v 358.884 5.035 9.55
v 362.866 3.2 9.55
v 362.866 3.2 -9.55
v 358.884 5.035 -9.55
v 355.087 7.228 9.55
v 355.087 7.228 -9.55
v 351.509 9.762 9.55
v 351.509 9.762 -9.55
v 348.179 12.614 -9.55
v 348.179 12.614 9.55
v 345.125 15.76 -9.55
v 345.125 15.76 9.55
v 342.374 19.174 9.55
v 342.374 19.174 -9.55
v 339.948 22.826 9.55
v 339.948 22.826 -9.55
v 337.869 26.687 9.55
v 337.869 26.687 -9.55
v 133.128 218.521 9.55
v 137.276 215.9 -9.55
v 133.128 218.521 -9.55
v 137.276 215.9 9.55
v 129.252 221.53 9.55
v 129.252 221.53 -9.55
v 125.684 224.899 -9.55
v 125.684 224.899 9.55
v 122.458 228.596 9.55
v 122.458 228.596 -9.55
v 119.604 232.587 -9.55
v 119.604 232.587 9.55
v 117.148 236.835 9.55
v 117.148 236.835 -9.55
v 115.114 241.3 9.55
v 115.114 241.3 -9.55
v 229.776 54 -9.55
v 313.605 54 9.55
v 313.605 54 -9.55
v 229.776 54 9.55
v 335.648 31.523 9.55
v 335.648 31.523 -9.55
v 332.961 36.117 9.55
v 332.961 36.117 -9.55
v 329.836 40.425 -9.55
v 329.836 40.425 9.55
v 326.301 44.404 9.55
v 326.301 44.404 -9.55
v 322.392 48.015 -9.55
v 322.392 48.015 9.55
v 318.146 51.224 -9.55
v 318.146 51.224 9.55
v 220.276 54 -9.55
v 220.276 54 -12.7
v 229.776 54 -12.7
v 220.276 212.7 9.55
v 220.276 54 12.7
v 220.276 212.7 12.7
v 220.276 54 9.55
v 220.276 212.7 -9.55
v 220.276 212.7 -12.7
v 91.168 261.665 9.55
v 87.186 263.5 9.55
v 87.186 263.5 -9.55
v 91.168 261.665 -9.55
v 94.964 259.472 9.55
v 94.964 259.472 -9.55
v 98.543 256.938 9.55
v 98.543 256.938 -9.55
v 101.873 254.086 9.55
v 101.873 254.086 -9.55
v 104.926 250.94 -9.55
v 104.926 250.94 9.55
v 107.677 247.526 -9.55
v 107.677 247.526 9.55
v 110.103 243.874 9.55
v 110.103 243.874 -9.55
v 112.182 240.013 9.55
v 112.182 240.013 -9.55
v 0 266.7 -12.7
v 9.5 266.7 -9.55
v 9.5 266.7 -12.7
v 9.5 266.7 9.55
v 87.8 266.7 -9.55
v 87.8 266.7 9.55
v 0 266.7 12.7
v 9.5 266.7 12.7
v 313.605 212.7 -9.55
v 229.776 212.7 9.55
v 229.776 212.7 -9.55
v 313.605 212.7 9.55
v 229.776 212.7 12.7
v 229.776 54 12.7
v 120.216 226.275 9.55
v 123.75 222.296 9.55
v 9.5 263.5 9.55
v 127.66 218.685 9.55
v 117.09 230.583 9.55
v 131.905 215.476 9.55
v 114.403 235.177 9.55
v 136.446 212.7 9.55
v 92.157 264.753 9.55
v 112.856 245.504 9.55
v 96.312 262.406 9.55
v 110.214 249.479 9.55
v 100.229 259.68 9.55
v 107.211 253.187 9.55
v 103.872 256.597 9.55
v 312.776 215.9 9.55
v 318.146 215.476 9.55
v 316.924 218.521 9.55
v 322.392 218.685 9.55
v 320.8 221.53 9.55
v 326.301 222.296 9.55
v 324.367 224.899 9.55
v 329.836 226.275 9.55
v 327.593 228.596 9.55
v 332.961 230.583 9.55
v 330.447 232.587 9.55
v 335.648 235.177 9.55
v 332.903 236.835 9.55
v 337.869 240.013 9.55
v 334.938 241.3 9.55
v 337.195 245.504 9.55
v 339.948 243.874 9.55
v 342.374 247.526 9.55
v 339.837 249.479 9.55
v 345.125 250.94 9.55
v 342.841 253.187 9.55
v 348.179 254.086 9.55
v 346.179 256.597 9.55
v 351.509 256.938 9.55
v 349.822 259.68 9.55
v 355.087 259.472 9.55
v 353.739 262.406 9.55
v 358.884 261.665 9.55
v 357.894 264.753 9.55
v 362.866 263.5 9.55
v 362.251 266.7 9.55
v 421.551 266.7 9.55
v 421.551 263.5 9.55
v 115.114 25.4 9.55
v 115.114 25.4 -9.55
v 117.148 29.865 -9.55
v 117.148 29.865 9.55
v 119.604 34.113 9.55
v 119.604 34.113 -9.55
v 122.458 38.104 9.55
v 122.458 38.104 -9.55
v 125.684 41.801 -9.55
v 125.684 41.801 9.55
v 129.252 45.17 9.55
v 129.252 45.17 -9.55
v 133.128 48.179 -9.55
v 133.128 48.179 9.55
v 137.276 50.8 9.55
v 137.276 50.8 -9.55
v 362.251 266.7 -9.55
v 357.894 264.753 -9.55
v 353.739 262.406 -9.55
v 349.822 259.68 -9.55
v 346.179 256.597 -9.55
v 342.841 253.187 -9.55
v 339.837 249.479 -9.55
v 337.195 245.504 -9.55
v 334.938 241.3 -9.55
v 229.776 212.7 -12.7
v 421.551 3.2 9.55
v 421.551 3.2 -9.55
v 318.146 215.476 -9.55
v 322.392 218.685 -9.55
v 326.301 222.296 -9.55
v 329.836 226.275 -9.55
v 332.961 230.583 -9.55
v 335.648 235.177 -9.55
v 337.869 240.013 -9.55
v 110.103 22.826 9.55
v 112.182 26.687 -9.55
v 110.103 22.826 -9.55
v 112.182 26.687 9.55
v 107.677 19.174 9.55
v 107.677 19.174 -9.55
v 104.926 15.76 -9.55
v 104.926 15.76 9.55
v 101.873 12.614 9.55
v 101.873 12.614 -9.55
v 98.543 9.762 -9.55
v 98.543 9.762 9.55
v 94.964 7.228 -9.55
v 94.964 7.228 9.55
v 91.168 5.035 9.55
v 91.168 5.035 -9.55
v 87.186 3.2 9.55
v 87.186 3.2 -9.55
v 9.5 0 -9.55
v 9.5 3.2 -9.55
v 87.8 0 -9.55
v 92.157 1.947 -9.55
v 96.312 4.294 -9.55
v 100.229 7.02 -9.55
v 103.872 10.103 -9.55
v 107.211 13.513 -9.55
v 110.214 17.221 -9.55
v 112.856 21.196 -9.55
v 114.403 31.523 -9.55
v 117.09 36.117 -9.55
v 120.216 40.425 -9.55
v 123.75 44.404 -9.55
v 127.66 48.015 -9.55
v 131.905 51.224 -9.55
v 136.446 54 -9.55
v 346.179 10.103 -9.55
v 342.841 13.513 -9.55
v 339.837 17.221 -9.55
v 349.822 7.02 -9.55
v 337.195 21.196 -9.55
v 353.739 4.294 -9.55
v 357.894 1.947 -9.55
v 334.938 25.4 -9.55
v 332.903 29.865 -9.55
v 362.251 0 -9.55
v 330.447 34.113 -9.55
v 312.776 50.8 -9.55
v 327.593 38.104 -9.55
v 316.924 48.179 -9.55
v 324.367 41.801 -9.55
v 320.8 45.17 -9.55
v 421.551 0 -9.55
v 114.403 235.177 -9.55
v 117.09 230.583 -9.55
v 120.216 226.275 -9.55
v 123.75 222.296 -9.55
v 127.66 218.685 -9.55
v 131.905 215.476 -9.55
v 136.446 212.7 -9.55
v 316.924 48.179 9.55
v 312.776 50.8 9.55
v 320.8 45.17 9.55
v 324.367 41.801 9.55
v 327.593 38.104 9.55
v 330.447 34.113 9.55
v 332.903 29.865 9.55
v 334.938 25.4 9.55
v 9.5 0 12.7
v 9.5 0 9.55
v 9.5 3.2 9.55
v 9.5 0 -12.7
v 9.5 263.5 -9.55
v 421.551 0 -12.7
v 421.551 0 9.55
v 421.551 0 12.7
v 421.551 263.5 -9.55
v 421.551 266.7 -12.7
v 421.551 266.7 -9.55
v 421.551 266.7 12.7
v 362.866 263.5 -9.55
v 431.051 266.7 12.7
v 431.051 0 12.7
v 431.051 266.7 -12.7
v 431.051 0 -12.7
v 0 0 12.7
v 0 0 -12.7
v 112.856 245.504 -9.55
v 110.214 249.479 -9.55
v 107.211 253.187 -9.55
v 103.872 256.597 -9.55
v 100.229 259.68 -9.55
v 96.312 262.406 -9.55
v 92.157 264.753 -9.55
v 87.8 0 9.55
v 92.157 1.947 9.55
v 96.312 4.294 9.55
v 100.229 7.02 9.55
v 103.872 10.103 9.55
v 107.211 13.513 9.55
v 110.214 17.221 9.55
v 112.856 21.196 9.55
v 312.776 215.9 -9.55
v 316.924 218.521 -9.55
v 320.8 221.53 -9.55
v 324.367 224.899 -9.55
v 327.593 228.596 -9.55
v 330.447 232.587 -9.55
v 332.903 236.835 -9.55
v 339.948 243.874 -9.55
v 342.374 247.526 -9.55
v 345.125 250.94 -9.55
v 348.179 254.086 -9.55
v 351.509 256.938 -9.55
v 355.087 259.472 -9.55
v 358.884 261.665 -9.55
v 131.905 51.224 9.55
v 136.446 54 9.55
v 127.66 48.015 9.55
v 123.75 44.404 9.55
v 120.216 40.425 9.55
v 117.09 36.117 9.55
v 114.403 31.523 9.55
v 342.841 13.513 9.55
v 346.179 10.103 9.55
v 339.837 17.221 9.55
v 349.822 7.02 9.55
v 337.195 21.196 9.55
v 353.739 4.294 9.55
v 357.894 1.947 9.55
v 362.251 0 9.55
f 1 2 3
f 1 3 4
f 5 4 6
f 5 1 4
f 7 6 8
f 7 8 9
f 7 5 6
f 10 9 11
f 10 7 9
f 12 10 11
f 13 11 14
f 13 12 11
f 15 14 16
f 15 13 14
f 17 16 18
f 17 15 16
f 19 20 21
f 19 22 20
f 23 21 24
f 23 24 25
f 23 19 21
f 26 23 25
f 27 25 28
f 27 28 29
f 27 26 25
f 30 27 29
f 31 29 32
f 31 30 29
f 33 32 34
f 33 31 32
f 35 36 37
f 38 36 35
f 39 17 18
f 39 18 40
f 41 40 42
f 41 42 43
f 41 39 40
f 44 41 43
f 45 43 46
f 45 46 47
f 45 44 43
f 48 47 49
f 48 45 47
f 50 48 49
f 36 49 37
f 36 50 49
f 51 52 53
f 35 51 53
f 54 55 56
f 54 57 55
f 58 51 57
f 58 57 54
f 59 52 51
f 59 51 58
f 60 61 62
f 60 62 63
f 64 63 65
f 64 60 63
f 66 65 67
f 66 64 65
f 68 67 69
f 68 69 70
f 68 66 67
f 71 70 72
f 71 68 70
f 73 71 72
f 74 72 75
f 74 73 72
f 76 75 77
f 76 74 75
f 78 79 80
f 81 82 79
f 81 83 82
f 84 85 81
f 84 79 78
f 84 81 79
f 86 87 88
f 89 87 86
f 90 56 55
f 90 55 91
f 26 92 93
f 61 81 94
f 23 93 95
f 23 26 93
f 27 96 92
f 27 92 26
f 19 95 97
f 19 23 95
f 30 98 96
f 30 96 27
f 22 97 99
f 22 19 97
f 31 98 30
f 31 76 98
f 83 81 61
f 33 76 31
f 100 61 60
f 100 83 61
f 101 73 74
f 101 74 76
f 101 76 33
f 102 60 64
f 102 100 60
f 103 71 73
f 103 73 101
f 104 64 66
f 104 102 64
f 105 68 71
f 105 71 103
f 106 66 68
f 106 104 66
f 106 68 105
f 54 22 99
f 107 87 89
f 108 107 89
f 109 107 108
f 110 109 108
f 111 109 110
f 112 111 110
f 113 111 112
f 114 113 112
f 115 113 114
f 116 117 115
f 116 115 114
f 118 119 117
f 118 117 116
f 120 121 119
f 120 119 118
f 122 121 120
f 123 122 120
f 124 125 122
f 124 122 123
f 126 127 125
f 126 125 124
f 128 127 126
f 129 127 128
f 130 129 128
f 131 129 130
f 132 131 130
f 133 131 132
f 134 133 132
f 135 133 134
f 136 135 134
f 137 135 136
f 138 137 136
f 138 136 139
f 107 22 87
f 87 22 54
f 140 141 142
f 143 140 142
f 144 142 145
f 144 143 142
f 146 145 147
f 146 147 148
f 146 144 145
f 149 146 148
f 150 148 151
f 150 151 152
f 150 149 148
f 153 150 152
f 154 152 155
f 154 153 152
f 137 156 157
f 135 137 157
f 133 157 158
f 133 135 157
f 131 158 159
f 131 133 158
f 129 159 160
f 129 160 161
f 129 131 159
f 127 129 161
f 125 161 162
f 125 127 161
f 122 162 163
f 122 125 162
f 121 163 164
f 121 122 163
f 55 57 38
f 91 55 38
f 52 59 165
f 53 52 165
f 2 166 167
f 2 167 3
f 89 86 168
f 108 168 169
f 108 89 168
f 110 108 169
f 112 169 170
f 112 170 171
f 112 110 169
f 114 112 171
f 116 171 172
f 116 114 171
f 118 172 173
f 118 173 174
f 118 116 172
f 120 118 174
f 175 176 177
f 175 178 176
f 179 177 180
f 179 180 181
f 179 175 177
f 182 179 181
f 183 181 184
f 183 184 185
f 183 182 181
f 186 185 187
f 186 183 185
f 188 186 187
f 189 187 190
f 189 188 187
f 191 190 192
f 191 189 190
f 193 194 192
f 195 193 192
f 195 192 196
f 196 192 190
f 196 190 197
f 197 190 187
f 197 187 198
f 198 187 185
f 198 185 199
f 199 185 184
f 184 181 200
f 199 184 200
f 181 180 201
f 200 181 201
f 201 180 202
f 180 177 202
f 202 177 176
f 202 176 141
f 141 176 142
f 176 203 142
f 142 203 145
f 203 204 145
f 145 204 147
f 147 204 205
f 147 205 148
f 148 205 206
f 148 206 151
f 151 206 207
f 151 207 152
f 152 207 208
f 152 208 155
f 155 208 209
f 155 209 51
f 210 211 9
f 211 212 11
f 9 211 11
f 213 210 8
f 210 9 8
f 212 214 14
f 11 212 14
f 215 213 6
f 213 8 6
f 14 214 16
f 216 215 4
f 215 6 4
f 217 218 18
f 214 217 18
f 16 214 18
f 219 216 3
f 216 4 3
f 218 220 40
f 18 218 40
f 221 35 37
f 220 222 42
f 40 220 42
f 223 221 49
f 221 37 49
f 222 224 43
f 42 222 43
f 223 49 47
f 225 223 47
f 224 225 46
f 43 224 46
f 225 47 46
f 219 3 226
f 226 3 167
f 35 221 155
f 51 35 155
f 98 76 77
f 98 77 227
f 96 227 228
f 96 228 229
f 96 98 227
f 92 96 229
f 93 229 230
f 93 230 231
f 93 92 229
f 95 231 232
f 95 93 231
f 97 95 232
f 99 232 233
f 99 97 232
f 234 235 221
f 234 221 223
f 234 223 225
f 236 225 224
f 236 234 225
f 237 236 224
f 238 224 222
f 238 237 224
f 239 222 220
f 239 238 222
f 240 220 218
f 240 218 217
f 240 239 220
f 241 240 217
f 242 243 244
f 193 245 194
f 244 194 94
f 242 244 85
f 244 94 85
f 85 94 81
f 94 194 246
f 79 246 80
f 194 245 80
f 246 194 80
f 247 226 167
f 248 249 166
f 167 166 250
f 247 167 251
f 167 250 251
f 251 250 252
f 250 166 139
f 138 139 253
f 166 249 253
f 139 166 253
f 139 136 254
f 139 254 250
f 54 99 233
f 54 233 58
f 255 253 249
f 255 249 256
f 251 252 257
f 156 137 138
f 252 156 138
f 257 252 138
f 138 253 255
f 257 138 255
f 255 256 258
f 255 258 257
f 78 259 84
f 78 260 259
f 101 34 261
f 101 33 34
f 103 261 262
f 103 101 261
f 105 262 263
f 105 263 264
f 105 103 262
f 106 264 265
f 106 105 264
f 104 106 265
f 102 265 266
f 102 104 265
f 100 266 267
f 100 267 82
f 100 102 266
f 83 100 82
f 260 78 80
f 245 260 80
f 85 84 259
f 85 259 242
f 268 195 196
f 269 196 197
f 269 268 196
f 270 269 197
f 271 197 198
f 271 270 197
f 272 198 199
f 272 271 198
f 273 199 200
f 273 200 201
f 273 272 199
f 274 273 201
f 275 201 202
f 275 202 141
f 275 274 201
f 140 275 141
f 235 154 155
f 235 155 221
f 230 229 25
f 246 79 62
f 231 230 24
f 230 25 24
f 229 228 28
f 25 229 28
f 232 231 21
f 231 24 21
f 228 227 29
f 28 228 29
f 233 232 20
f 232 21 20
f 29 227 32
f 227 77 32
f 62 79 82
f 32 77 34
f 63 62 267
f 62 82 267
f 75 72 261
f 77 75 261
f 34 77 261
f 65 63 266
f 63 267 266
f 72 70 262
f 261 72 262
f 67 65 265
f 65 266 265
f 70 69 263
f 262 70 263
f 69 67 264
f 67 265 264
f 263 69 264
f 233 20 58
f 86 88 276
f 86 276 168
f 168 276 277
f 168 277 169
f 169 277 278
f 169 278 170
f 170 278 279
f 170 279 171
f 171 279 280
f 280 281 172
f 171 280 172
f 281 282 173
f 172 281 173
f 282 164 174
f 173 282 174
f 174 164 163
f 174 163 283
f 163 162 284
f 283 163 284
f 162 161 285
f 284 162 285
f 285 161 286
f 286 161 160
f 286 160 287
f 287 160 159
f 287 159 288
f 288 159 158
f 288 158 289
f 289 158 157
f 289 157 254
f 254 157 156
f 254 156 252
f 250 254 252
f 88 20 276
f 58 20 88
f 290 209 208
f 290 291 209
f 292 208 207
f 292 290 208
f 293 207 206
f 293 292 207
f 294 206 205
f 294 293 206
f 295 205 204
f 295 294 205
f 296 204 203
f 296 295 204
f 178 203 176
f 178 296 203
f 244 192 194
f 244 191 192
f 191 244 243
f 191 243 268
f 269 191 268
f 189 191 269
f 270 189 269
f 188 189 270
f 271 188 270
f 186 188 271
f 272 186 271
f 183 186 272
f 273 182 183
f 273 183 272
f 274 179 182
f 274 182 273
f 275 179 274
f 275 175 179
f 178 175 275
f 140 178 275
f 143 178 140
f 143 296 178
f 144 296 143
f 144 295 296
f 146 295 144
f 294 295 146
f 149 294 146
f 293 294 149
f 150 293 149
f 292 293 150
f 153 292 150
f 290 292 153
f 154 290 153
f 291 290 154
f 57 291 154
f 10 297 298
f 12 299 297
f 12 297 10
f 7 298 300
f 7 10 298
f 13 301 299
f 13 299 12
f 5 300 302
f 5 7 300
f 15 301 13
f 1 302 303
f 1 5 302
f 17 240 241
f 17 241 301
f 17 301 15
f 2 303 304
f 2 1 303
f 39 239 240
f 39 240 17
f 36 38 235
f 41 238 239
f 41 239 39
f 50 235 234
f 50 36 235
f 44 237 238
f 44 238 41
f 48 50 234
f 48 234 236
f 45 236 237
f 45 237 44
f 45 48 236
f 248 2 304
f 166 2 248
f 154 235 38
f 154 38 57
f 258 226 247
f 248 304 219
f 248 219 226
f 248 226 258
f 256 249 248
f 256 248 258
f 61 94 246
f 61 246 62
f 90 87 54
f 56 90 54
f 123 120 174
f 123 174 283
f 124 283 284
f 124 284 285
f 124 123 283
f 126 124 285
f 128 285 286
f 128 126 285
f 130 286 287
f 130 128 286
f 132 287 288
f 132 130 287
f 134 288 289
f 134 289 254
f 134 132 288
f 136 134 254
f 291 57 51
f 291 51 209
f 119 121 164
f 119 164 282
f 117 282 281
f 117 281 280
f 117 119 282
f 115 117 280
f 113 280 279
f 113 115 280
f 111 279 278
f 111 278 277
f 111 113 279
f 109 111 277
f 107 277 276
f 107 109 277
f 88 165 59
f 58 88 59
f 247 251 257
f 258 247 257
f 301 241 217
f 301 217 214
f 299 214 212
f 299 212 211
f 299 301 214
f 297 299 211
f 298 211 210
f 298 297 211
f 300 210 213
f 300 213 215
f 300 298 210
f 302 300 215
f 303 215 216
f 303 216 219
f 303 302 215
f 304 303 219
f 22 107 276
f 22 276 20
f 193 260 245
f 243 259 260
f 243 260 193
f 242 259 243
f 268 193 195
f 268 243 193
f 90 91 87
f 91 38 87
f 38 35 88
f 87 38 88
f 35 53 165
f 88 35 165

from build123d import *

# Parameters (mm, degrees)
BOSS_EXTRUDE1_DEPTH   = 9.55
BOSS_EXTRUDE1_2_DEPTH = 9.55
SKETCH2_W             = 9.5
SKETCH2_H             = 266.7
SKETCH2_W_2           = 4.75
SKETCH2_H_2           = 158.7
BOSS_EXTRUDE2_DEPTH   = 12.7


with BuildPart() as part:
    # Sketch1 → Boss-Extrude1 (new, symmetric)
    with BuildSketch(Plane.XY):
        with BuildLine():
            Line((87.8, 266.7), (9.5, 266.7))
            Line((9.5, 266.7), (9.5, 263.5))
            Line((9.5, 263.5), (87.185653041, 263.5))
            ThreePointArc((87.185653041, 263.5), (101.872730764, 254.086326296), (112.181844193, 240.013313649))
            ThreePointArc((112.181844193, 240.013313649), (121.93402425, 224.242253512), (136.446354787, 212.7))
            Line((136.446354787, 212.7), (313.604913576, 212.7))
            ThreePointArc((313.604913576, 212.7), (328.117244113, 224.242253512), (337.86942417, 240.013313649))
            ThreePointArc((337.86942417, 240.013313649), (348.178537599, 254.086326296), (362.865615322, 263.5))
            Line((362.865615322, 263.5), (421.551268364, 263.5))
            Line((421.551268364, 263.5), (421.551268364, 266.7))
            Line((421.551268364, 266.7), (362.251268364, 266.7))
            ThreePointArc((362.251268364, 266.7), (346.178913489, 256.597493698), (334.937565202, 241.3))
            ThreePointArc((334.937565202, 241.3), (326.024834919, 226.70817797), (312.775634182, 215.9))
            Line((312.775634182, 215.9), (137.275634182, 215.9))
            ThreePointArc((137.275634182, 215.9), (124.026433444, 226.70817797), (115.113703162, 241.3))
            ThreePointArc((115.113703162, 241.3), (103.872354874, 256.597493698), (87.8, 266.7))
        make_face()
    extrude(amount=BOSS_EXTRUDE1_DEPTH, both=True)



with BuildPart() as body_2:
    # Sketch1 → Boss-Extrude1 2 (new, symmetric)
    with BuildSketch(Plane.XY):
        with BuildLine():
            Line((87.185653041, 3.2), (9.5, 3.2))
            Line((9.5, 3.2), (9.5, 0))
            Line((9.5, 0), (87.8, 0))
            ThreePointArc((87.8, 0), (103.872354874, 10.102506302), (115.113703162, 25.4))
            ThreePointArc((115.113703162, 25.4), (124.026433444, 39.99182203), (137.275634182, 50.8))
            Line((137.275634182, 50.8), (312.775634182, 50.8))
            ThreePointArc((312.775634182, 50.8), (326.024834919, 39.99182203), (334.937565202, 25.4))
            ThreePointArc((334.937565202, 25.4), (346.178913489, 10.102506302), (362.251268364, 0))
            Line((362.251268364, 0), (421.551268364, 0))
            Line((421.551268364, 0), (421.551268364, 3.2))
            Line((421.551268364, 3.2), (362.865615322, 3.2))
            ThreePointArc((362.865615322, 3.2), (348.178537599, 12.613673704), (337.86942417, 26.686686351))
            ThreePointArc((337.86942417, 26.686686351), (328.117244113, 42.457746488), (313.604913576, 54))
            Line((313.604913576, 54), (136.446354787, 54))
            ThreePointArc((136.446354787, 54), (121.93402425, 42.457746488), (112.181844193, 26.686686351))
            ThreePointArc((112.181844193, 26.686686351), (101.872730764, 12.613673704), (87.185653041, 3.2))
        make_face()
    extrude(amount=BOSS_EXTRUDE1_2_DEPTH, both=True)


with BuildPart() as part_1:
    add(part.part)

    add(body_2.part)  # Boss-Extrude2 merges body 2
    # Sketch2 → Boss-Extrude2 (add, symmetric)
    with BuildSketch(Plane.XY):
        with Locations((4.75, 133.35)):
            Rectangle(SKETCH2_W, SKETCH2_H)
        with Locations((222.650634182, 133.35)):
            Rectangle(SKETCH2_W_2, SKETCH2_H_2)
        with Locations((227.400634182, 133.35)):
            Rectangle(SKETCH2_W_2, SKETCH2_H_2)
        with Locations((426.301268364, 133.35)):
            Rectangle(SKETCH2_W, SKETCH2_H)
    extrude(amount=BOSS_EXTRUDE2_DEPTH, both=True)


solid = part_1.part
